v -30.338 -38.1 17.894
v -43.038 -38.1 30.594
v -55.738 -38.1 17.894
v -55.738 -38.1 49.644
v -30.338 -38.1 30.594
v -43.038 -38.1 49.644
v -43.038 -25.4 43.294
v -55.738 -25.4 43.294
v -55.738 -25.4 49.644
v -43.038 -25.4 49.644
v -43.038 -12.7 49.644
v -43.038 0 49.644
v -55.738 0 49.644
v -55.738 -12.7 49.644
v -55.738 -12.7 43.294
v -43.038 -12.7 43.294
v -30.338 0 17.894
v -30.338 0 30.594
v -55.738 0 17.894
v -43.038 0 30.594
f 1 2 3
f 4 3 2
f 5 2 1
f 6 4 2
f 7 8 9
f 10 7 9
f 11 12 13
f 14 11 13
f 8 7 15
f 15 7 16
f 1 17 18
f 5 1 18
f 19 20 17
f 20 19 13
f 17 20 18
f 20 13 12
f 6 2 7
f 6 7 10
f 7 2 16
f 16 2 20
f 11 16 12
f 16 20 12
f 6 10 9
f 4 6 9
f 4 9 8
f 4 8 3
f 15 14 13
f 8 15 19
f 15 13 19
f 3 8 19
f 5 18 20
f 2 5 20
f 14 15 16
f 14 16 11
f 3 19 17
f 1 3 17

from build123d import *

# Parameters (mm, degrees)
F1_DEPTH = 38.1
F2_W     = 12.7
F2_H     = 6.35
F3_DEPTH = 12.7
F4_DEPTH = 12.7
F5_W     = 12.7
F5_H     = 6.35
F6_DEPTH = 12.7


with BuildPart() as f1:
    # F0 (on Front) → F1 (new body)
    with BuildSketch(Plane.XZ):
        Polygon((-43.0376454253, 49.6439802366), (-55.7376454253, 49.6439802366), (-55.7376454253, 17.8939802366), (-30.3376454253, 17.8939802366), (-30.3376454253, 30.5939802366), (-43.0376454253, 30.5939802366), align=None)
    extrude(amount=F1_DEPTH)

    # F2 (on face) → F3 (join)
    with BuildSketch(Plane.YZ.offset(-43.0376454253)):
        with Locations((-17.718813771, 46.4689802366)):
            Rectangle(F2_W, F2_H)
    extrude(amount=F3_DEPTH)

    # F4 (cut): a face of the model
    f4_faces = [f1.faces().sort_by_distance(p)[0] for p in [
        (-30.3376454253, -17.718813771, 46.4689802366),
    ]]
    extrude(f4_faces, amount=-F4_DEPTH, mode=Mode.SUBTRACT)

    # F5 (on face) → F6 (cut)
    with BuildSketch(Plane.YZ.offset(-43.0376454253)):
        with Locations((-19.05, 46.4689802366)):
            Rectangle(F5_W, F5_H)
    extrude(amount=-F6_DEPTH, mode=Mode.SUBTRACT)


solid = f1.part
